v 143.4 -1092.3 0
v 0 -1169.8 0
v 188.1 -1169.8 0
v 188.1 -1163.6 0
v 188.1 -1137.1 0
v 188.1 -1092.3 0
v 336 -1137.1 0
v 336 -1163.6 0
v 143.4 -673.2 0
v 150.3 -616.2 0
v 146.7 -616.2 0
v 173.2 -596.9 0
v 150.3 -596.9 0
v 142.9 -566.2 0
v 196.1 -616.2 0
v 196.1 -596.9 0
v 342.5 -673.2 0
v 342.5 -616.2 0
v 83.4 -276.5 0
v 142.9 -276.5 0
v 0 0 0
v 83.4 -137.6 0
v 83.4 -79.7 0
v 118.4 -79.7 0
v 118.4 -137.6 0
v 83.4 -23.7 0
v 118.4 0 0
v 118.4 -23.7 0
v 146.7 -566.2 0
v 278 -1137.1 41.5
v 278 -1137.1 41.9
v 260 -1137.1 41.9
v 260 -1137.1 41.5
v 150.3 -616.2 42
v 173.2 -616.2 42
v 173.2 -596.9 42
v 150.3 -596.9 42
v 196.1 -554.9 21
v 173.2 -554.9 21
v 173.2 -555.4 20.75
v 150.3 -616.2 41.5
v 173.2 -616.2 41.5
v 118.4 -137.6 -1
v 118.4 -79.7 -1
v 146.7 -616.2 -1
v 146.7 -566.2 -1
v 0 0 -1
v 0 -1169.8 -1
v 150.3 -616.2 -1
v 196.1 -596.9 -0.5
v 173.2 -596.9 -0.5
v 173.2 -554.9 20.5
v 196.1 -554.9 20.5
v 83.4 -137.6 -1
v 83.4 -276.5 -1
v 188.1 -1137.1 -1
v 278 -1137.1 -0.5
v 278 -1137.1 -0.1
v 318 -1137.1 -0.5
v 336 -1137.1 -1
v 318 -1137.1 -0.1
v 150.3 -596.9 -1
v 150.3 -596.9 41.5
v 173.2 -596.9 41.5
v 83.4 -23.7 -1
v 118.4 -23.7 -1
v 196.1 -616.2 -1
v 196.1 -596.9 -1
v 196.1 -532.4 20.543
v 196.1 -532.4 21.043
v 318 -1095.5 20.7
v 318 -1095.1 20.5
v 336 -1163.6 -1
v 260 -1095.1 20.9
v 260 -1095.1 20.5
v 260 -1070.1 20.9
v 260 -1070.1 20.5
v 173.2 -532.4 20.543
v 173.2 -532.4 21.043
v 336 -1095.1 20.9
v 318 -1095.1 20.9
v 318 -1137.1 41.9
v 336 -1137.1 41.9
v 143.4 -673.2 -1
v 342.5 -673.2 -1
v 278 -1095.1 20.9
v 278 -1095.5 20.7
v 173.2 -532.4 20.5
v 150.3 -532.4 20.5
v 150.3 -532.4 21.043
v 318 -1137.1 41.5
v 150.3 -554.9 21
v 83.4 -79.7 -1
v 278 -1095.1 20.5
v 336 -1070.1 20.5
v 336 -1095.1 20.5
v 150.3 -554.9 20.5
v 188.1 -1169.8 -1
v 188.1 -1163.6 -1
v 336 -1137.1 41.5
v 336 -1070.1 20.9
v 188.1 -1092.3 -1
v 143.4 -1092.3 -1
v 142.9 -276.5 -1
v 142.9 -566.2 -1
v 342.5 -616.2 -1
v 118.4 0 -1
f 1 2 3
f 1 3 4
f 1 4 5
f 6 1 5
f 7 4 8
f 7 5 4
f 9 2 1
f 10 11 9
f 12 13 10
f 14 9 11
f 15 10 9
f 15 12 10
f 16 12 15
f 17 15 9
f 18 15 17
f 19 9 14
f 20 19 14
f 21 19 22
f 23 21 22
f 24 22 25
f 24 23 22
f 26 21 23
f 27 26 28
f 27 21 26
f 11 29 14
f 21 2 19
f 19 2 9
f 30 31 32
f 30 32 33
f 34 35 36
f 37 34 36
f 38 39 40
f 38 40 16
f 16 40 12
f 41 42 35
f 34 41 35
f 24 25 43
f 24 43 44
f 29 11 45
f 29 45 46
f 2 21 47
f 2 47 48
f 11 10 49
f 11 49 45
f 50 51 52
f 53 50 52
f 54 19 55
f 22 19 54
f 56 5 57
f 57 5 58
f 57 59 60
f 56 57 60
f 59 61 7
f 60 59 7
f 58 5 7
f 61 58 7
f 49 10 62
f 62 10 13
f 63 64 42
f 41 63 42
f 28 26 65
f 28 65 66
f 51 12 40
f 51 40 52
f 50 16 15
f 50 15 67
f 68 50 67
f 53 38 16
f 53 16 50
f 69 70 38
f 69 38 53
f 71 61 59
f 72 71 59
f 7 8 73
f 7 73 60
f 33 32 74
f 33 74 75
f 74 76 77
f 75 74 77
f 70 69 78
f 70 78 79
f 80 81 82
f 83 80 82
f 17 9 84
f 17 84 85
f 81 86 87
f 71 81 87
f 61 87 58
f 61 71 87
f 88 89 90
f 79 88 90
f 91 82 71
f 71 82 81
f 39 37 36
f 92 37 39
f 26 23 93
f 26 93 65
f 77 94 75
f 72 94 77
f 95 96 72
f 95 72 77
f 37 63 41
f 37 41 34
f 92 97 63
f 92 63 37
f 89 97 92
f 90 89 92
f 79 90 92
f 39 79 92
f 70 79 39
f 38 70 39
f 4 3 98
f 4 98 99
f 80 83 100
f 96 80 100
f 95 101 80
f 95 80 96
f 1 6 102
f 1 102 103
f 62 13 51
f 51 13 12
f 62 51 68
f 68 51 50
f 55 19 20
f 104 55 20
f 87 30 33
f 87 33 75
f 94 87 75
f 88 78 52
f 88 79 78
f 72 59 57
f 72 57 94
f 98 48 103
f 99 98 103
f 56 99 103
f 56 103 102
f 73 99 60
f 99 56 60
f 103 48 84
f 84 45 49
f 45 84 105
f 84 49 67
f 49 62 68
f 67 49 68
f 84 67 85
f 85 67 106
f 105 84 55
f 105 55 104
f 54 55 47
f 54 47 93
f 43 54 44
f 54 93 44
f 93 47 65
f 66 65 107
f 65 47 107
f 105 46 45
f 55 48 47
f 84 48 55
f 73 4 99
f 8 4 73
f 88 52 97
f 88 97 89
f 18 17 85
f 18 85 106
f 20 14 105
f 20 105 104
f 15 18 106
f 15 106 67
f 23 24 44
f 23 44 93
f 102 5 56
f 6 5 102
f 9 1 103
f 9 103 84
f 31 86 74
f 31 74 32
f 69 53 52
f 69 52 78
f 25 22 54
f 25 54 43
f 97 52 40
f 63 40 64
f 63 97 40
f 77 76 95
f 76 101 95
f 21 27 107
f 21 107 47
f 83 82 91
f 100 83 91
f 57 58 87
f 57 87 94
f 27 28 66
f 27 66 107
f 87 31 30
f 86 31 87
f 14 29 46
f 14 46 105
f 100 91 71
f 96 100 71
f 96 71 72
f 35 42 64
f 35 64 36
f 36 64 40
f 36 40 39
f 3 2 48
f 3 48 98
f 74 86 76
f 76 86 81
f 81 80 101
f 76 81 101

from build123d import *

# Parameters (mm, degrees)
SKETCH_1_W        = 15.2
SKETCH_1_H        = 25
SKETCH_1_W_2      = 15.9
SKETCH_1_W_3      = 60
SKETCH_1_H_2      = 55.8
SKETCH_1_H_3      = 56.6
SKETCH_1_H_4      = 59.4
SKETCH_1_W_4      = 147.9
SKETCH_1_H_5      = 26.5
SKETCH_1_H_6      = 78.6
SKETCH_1_H_7      = 80.6
SKETCH_1_H_8      = 81.1
SKETCH_1_W_5      = 59.5
SKETCH_1_H_9      = 83.5
SKETCH_1_H_10     = 84.1
SKETCH_1_H_11     = 84.6
SKETCH_1_H_12     = 84.7
SKETCH_1_H_13     = 103
SKETCH_1_H_14     = 103.2
SKETCH_1_H_15     = 105.1
SKETCH_1_H_16     = 111.3
SKETCH_1_H_17     = 127.2
SKETCH_1_H_18     = 130
EXTRUDE_1_DEPTH   = 1
SKETCH_2_W        = 45.8
SKETCH_2_H        = 19.3
EXTRUDE_2_DEPTH   = 1
EXTRUDE_3_DEPTH   = 22.9
EXTRUDE_4_DEPTH   = 22.9
SKETCH_6_W        = 0.4
SKETCH_6_H        = 25
EXTRUDE_6_DEPTH   = 40
SKETCH_7_W        = 0.4
SKETCH_7_H        = 25
EXTRUDE_7_DEPTH   = 18
EXTRUDE_720_DEPTH = 22.9


with BuildPart() as part:
    # 草图1 → 拉伸1 (new body)
    with BuildSketch(Plane.XY):
        with Locations((91, -1104.8)):
            Rectangle(SKETCH_1_W, SKETCH_1_H)
        with Locations((106.55, -1104.8)):
            Rectangle(SKETCH_1_W_2, SKETCH_1_H)
        with Locations((113.4, -865.7)):
            Rectangle(SKETCH_1_W_3, SKETCH_1_H_2)
        with Locations((30, -811.2)):
            Rectangle(SKETCH_1_W_3, SKETCH_1_H_3)
        with Locations((30, -306.2)):
            Rectangle(SKETCH_1_W_3, SKETCH_1_H_4)
        with Locations((262.05, -1150.35)):
            Rectangle(SKETCH_1_W_4, SKETCH_1_H_5)
        with Locations((30, -1130.5)):
            Rectangle(SKETCH_1_W_3, SKETCH_1_H_6)
        with Locations((30, -40.3)):
            Rectangle(SKETCH_1_W_3, SKETCH_1_H_7)
        with Locations((113.4, -713.75)):
            Rectangle(SKETCH_1_W_3, SKETCH_1_H_8)
        with Locations((113.15, -421.25)):
            Rectangle(SKETCH_1_W_5, SKETCH_1_H_9)
        with Locations((30, -1049.45)):
            Rectangle(SKETCH_1_W_3, SKETCH_1_H_9)
        with Locations((113.4, -796.05)):
            Rectangle(SKETCH_1_W_3, SKETCH_1_H_9)
        with Locations((30, -965.65)):
            Rectangle(SKETCH_1_W_3, SKETCH_1_H_10)
        with Locations((30, -881.55)):
            Rectangle(SKETCH_1_W_3, SKETCH_1_H_10)
        with Locations((30, -234.2)):
            Rectangle(SKETCH_1_W_3, SKETCH_1_H_11)
        with Locations((30, -378.25)):
            Rectangle(SKETCH_1_W_3, SKETCH_1_H_12)
        with Locations((113.4, -935.95)):
            Rectangle(SKETCH_1_W_3, SKETCH_1_H_12)
        with Locations((113.15, -328)):
            Rectangle(SKETCH_1_W_5, SKETCH_1_H_13)
        with Locations((113.15, -514.6)):
            Rectangle(SKETCH_1_W_5, SKETCH_1_H_14)
        with Locations((30, -730.35)):
            Rectangle(SKETCH_1_W_3, SKETCH_1_H_15)
        with Locations((30, -136.25)):
            Rectangle(SKETCH_1_W_3, SKETCH_1_H_16)
        Polygon((83.4, -978.3), (143.4, -978.3), (143.4, -1092.3), (114.5, -1092.3), (98.6, -1092.3), (83.4, -1092.3), align=None)
        with Locations((30, -614.2)):
            Rectangle(SKETCH_1_W_3, SKETCH_1_H_17)
        with Locations((30, -485.6)):
            Rectangle(SKETCH_1_W_3, SKETCH_1_H_18)
        Polygon((188.1, -1117.3), (188.1, -1092.3), (166.2, -1092.3), (143.4, -1092.3), (114.5, -1092.3), (114.5, -1117.3), (98.6, -1117.3), (83.4, -1117.3), (83.4, -1092.3), (83.4, -978.3), (83.4, -893.6), (83.4, -837.8), (83.4, -754.3), (83.4, -673.2), (143.4, -673.2), (342.5, -673.2), (342.5, -616.2), (192.5, -616.2), (146.7, -616.2), (146.7, -566.2), (142.9, -566.2), (83.4, -566.2), (83.4, -463), (83.4, -379.5), (83.4, -276.5), (83.4, -137.6), (118.4, -137.6), (118.4, -79.7), (83.4, -79.7), (83.4, -23.7), (118.4, -23.7), (118.4, 0), (60, 0), (60, -80.6), (60, -191.9), (60, -276.5), (60, -335.9), (60, -420.6), (60, -550.6), (60, -677.8), (60, -782.9), (60, -839.5), (60, -923.6), (60, -1007.7), (60, -1091.2), (60, -1169.8), (188.1, -1169.8), (188.1, -1163.6), (188.1, -1137.1), align=None)
    extrude(amount=-EXTRUDE_1_DEPTH)

    # 草图2 → 拉伸2 (add)
    with BuildSketch(Plane.XY):
        with Locations((173.2, -606.55)):
            Rectangle(SKETCH_2_W, SKETCH_2_H)
    extrude(amount=-EXTRUDE_2_DEPTH)

    # 草图3 → 拉伸3 (add)
    with BuildSketch(Plane(origin=(173.2, -616.2, 0), x_dir=(0, 0, -1), z_dir=(1, 0, 0))):
        Polygon((-21.04289792, 83.799959106), (-21, 61.3), (-20.5, 61.3), (-20.54289792, 83.799959106), align=None)
        Polygon((-21, 61.3), (0, 19.3), (0.5, 19.3), (-20.5, 61.3), align=None)
    extrude(amount=EXTRUDE_3_DEPTH)

    # 草图4 → 拉伸4 (add)
    with BuildSketch(Plane(origin=(173.2, -616.2, 0), x_dir=(0, 0, -1), z_dir=(1, 0, 0))):
        Polygon((-20.5, 61.3), (-20.5, 83.8), (-21.04289792, 83.799959106), (-21, 61.3), align=None)
    extrude(amount=-EXTRUDE_4_DEPTH)

    # 草图6 → 拉伸6 (add)
    with BuildSketch(Plane(origin=(318, -1163.6, 0), x_dir=(0, 0, -1), z_dir=(1, 0, 0))):
        with Locations((-20.7, 81)):
            Rectangle(SKETCH_6_W, SKETCH_6_H)
        Polygon((-20.9, 68.5), (0.1, 26.5), (0.5, 26.5), (-20.5, 68.5), align=None)
    extrude(amount=-EXTRUDE_6_DEPTH)

    # 草图7 → 拉伸7 (add)
    with BuildSketch(Plane(origin=(318, -1163.6, 0), x_dir=(0, 0, -1), z_dir=(1, 0, 0))):
        with Locations((-20.7, 81)):
            Rectangle(SKETCH_7_W, SKETCH_7_H)
        Polygon((-41.9, 26.5), (-41.5, 26.5), (-20.5, 68.5), (-20.9, 68.5), align=None)
    extrude_7 = extrude(amount=EXTRUDE_7_DEPTH)

    # 镜像1: 拉伸7 across plane
    add(extrude_7.mirror(Plane(origin=(298, -1163.6, 0), x_dir=(0, 0, 1), z_dir=(1, 0, 0))))

    # 草图9 → 凸台-拉伸720 (add)
    with BuildSketch(Plane.ZY.offset(-150.3)):
        Polygon((21, -554.9), (20.5, -554.9), (41.5, -596.9), (41.5, -616.2), (42, -616.2), (42, -596.9), align=None)
    extrude(amount=-EXTRUDE_720_DEPTH)


solid = part.part
